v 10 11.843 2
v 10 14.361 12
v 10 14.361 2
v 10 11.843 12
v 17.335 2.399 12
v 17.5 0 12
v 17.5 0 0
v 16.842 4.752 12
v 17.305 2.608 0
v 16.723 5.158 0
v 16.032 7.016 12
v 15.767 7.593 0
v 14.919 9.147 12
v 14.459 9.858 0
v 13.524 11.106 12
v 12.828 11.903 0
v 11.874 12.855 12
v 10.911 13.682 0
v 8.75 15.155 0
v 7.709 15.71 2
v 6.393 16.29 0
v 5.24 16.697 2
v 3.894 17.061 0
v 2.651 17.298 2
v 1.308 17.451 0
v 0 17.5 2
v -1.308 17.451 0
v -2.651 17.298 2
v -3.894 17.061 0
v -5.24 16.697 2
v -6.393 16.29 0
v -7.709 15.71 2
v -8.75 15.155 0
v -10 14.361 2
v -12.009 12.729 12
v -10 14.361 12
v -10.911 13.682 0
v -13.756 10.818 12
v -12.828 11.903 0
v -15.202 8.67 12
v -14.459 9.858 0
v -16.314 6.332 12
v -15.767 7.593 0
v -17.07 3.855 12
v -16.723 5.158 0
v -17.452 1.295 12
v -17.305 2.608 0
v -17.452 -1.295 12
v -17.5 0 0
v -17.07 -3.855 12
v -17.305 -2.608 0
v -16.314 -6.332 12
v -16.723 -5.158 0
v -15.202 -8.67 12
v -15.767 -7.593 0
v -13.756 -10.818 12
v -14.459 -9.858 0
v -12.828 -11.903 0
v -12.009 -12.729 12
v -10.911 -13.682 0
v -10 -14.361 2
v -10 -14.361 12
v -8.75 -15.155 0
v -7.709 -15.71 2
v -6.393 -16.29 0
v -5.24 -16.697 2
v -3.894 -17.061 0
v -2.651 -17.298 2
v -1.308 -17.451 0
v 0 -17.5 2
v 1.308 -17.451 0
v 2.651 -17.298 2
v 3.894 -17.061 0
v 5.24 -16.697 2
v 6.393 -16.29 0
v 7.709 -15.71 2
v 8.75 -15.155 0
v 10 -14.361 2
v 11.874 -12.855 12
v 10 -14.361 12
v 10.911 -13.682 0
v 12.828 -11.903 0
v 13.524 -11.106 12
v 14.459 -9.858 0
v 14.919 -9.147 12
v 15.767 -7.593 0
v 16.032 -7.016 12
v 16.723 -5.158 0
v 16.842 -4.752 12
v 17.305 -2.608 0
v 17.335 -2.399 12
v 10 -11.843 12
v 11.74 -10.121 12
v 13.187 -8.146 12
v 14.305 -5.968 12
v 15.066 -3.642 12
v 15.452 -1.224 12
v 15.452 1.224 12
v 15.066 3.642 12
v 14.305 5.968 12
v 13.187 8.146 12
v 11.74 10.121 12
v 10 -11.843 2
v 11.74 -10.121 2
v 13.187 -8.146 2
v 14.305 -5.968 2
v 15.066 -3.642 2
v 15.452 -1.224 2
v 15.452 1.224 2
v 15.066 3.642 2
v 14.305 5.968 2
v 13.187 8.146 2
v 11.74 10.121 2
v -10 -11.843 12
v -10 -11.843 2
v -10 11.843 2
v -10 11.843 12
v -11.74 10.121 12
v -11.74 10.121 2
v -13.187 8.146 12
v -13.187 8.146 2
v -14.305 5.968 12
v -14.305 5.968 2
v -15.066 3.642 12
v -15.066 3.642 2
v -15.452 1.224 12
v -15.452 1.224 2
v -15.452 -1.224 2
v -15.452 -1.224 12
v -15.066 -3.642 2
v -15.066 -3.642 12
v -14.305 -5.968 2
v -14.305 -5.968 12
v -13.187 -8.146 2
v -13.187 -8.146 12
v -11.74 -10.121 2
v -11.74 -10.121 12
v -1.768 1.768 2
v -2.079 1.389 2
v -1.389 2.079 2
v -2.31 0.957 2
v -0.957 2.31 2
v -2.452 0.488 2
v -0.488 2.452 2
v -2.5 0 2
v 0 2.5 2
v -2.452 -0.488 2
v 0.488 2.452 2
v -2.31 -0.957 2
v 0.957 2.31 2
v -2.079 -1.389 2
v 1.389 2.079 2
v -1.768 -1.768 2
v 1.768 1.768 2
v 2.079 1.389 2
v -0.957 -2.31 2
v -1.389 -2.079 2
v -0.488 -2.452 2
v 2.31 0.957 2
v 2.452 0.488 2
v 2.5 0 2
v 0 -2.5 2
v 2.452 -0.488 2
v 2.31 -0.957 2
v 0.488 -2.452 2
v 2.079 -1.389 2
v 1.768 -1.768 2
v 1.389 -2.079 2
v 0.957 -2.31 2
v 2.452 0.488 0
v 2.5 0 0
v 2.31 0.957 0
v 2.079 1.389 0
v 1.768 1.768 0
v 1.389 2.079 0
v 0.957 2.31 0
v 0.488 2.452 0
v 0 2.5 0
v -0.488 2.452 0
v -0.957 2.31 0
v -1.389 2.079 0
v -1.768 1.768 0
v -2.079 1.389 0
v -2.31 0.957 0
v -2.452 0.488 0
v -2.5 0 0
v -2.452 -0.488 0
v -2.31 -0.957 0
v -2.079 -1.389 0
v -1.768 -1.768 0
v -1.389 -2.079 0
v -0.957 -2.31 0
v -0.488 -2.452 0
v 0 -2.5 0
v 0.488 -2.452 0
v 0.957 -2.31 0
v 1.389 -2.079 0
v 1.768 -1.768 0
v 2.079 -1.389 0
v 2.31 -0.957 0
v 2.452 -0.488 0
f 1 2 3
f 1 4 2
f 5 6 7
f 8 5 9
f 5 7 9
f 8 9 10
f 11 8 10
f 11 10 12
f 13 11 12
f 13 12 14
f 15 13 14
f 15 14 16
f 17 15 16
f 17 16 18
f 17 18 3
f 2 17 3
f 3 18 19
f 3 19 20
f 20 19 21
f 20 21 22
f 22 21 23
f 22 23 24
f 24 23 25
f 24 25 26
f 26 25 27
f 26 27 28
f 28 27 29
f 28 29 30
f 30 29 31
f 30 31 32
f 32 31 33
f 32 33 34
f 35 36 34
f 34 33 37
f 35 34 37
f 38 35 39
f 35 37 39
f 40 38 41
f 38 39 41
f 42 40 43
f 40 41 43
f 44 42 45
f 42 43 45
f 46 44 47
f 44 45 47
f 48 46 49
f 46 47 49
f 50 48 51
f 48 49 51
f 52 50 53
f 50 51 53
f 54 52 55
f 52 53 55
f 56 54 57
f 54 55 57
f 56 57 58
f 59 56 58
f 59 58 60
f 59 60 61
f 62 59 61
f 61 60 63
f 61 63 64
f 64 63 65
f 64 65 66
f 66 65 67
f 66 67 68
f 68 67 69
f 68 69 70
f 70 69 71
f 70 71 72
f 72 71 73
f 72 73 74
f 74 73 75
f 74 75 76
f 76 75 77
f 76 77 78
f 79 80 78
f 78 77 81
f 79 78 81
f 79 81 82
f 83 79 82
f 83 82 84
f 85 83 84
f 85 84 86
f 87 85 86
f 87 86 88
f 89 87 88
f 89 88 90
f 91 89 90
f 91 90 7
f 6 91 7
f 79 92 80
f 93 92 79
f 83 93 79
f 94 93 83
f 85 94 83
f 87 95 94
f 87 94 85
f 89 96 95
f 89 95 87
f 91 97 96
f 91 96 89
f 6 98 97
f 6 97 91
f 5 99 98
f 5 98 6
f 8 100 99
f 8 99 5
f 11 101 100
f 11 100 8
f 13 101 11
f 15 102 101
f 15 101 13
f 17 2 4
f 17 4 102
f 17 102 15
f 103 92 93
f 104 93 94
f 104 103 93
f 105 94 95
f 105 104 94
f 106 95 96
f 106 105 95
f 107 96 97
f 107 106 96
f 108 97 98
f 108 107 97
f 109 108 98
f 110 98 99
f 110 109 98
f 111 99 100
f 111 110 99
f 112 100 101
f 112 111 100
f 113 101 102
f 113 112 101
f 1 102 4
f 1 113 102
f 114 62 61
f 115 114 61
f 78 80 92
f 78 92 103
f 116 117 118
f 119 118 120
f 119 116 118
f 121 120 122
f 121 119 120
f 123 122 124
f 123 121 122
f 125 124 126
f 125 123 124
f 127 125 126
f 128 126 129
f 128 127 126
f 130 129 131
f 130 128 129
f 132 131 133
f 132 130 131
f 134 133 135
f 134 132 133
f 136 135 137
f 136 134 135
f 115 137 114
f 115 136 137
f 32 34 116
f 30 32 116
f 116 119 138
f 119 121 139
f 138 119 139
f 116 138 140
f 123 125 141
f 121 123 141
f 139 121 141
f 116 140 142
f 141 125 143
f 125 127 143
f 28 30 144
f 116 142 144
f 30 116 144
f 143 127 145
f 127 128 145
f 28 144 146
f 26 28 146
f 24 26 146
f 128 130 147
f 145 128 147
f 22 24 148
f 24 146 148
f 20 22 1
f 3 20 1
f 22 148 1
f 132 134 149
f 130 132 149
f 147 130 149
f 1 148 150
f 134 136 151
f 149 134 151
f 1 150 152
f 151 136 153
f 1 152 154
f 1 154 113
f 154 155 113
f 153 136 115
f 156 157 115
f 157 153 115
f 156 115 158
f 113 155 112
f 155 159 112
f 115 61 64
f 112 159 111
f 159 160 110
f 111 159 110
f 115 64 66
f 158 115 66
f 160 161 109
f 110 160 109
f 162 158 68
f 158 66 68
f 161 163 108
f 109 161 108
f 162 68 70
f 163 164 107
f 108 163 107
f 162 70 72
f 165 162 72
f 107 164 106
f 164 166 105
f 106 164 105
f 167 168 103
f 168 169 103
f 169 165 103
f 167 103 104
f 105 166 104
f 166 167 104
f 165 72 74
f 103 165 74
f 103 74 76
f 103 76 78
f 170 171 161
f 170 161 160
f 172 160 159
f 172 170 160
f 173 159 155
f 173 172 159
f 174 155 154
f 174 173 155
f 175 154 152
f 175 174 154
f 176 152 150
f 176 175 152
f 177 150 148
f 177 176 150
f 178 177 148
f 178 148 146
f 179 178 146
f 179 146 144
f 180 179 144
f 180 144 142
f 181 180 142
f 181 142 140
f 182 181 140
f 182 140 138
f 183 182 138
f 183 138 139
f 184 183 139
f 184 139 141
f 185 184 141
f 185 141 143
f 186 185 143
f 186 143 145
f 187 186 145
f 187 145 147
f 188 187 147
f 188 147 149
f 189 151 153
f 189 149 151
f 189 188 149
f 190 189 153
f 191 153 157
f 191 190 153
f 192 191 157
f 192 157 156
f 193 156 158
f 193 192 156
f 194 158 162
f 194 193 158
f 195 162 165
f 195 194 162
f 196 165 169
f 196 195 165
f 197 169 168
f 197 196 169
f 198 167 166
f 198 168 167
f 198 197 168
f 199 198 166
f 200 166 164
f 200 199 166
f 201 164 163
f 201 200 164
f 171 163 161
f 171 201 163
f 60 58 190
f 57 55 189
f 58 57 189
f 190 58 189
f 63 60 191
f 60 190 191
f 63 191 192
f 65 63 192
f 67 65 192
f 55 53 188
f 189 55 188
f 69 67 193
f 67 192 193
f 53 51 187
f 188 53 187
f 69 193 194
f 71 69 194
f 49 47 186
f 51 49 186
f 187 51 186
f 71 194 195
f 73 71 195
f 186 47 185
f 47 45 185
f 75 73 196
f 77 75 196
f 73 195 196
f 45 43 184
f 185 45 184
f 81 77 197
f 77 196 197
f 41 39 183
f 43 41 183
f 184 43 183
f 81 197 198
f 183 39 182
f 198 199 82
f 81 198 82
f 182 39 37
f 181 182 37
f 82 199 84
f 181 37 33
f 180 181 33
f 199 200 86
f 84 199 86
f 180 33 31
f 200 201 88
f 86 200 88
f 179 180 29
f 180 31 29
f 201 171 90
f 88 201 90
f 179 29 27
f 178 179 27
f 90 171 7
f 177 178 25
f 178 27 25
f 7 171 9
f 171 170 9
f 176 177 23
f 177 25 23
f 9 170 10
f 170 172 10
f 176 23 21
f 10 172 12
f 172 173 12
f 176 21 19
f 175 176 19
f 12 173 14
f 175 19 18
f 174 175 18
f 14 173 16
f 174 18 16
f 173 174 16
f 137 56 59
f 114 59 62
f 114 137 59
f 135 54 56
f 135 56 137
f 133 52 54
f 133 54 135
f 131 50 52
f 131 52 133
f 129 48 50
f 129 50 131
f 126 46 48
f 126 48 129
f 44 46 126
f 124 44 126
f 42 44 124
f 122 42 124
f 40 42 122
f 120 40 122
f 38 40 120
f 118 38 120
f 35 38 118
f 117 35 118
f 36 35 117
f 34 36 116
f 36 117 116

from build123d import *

# Parameters (mm, degrees)
SKETCH1_R               = 17.5
BOSS_EXTRUDE1_DEPTH     = 12
SHELL4_T                = -2
CUT_EXTRUDE1_DEPTH      = 28.504545079
CUT_EXTRUDE1_DEPTH_BACK = 28.504545079
SKETCH3_R               = 2.5
CUT_EXTRUDE2_DEPTH      = 28.504545079
CUT_EXTRUDE2_DEPTH_BACK = 28.504545079
SKETCH4_W               = 20
SKETCH4_H               = 24.94066955


with BuildPart() as part:
    # Sketch1 → Boss-Extrude1 (new body)
    with BuildSketch(Plane.XY):
        Circle(SKETCH1_R)
    extrude(amount=BOSS_EXTRUDE1_DEPTH)

    # Shell4
    shell4_openings = [part.faces().sort_by_distance(p)[0] for p in [
        (0, 0, 12),
    ]]
    offset(amount=SHELL4_T, openings=shell4_openings, kind=Kind.INTERSECTION)

    # Sketch3 → Cut-Extrude1 (cut, two sides: drawn at the far end of the back side and taken through both)
    with BuildSketch(Plane.XY.offset(-CUT_EXTRUDE1_DEPTH_BACK)):
        Circle(SKETCH3_R)
    extrude(amount=CUT_EXTRUDE1_DEPTH + CUT_EXTRUDE1_DEPTH_BACK, mode=Mode.SUBTRACT)

    # Sketch4 → Cut-Extrude2 (cut, two sides: drawn at the far end of the back side and taken through both)
    with BuildSketch(Plane(origin=(0, 0, 0), x_dir=(1, 0, 0), z_dir=(0, 1, 0)).offset(-CUT_EXTRUDE2_DEPTH_BACK)):
        with Locations((0, -14.470334775)):
            Rectangle(SKETCH4_W, SKETCH4_H)
    extrude(amount=CUT_EXTRUDE2_DEPTH + CUT_EXTRUDE2_DEPTH_BACK, mode=Mode.SUBTRACT)


solid = part.part
